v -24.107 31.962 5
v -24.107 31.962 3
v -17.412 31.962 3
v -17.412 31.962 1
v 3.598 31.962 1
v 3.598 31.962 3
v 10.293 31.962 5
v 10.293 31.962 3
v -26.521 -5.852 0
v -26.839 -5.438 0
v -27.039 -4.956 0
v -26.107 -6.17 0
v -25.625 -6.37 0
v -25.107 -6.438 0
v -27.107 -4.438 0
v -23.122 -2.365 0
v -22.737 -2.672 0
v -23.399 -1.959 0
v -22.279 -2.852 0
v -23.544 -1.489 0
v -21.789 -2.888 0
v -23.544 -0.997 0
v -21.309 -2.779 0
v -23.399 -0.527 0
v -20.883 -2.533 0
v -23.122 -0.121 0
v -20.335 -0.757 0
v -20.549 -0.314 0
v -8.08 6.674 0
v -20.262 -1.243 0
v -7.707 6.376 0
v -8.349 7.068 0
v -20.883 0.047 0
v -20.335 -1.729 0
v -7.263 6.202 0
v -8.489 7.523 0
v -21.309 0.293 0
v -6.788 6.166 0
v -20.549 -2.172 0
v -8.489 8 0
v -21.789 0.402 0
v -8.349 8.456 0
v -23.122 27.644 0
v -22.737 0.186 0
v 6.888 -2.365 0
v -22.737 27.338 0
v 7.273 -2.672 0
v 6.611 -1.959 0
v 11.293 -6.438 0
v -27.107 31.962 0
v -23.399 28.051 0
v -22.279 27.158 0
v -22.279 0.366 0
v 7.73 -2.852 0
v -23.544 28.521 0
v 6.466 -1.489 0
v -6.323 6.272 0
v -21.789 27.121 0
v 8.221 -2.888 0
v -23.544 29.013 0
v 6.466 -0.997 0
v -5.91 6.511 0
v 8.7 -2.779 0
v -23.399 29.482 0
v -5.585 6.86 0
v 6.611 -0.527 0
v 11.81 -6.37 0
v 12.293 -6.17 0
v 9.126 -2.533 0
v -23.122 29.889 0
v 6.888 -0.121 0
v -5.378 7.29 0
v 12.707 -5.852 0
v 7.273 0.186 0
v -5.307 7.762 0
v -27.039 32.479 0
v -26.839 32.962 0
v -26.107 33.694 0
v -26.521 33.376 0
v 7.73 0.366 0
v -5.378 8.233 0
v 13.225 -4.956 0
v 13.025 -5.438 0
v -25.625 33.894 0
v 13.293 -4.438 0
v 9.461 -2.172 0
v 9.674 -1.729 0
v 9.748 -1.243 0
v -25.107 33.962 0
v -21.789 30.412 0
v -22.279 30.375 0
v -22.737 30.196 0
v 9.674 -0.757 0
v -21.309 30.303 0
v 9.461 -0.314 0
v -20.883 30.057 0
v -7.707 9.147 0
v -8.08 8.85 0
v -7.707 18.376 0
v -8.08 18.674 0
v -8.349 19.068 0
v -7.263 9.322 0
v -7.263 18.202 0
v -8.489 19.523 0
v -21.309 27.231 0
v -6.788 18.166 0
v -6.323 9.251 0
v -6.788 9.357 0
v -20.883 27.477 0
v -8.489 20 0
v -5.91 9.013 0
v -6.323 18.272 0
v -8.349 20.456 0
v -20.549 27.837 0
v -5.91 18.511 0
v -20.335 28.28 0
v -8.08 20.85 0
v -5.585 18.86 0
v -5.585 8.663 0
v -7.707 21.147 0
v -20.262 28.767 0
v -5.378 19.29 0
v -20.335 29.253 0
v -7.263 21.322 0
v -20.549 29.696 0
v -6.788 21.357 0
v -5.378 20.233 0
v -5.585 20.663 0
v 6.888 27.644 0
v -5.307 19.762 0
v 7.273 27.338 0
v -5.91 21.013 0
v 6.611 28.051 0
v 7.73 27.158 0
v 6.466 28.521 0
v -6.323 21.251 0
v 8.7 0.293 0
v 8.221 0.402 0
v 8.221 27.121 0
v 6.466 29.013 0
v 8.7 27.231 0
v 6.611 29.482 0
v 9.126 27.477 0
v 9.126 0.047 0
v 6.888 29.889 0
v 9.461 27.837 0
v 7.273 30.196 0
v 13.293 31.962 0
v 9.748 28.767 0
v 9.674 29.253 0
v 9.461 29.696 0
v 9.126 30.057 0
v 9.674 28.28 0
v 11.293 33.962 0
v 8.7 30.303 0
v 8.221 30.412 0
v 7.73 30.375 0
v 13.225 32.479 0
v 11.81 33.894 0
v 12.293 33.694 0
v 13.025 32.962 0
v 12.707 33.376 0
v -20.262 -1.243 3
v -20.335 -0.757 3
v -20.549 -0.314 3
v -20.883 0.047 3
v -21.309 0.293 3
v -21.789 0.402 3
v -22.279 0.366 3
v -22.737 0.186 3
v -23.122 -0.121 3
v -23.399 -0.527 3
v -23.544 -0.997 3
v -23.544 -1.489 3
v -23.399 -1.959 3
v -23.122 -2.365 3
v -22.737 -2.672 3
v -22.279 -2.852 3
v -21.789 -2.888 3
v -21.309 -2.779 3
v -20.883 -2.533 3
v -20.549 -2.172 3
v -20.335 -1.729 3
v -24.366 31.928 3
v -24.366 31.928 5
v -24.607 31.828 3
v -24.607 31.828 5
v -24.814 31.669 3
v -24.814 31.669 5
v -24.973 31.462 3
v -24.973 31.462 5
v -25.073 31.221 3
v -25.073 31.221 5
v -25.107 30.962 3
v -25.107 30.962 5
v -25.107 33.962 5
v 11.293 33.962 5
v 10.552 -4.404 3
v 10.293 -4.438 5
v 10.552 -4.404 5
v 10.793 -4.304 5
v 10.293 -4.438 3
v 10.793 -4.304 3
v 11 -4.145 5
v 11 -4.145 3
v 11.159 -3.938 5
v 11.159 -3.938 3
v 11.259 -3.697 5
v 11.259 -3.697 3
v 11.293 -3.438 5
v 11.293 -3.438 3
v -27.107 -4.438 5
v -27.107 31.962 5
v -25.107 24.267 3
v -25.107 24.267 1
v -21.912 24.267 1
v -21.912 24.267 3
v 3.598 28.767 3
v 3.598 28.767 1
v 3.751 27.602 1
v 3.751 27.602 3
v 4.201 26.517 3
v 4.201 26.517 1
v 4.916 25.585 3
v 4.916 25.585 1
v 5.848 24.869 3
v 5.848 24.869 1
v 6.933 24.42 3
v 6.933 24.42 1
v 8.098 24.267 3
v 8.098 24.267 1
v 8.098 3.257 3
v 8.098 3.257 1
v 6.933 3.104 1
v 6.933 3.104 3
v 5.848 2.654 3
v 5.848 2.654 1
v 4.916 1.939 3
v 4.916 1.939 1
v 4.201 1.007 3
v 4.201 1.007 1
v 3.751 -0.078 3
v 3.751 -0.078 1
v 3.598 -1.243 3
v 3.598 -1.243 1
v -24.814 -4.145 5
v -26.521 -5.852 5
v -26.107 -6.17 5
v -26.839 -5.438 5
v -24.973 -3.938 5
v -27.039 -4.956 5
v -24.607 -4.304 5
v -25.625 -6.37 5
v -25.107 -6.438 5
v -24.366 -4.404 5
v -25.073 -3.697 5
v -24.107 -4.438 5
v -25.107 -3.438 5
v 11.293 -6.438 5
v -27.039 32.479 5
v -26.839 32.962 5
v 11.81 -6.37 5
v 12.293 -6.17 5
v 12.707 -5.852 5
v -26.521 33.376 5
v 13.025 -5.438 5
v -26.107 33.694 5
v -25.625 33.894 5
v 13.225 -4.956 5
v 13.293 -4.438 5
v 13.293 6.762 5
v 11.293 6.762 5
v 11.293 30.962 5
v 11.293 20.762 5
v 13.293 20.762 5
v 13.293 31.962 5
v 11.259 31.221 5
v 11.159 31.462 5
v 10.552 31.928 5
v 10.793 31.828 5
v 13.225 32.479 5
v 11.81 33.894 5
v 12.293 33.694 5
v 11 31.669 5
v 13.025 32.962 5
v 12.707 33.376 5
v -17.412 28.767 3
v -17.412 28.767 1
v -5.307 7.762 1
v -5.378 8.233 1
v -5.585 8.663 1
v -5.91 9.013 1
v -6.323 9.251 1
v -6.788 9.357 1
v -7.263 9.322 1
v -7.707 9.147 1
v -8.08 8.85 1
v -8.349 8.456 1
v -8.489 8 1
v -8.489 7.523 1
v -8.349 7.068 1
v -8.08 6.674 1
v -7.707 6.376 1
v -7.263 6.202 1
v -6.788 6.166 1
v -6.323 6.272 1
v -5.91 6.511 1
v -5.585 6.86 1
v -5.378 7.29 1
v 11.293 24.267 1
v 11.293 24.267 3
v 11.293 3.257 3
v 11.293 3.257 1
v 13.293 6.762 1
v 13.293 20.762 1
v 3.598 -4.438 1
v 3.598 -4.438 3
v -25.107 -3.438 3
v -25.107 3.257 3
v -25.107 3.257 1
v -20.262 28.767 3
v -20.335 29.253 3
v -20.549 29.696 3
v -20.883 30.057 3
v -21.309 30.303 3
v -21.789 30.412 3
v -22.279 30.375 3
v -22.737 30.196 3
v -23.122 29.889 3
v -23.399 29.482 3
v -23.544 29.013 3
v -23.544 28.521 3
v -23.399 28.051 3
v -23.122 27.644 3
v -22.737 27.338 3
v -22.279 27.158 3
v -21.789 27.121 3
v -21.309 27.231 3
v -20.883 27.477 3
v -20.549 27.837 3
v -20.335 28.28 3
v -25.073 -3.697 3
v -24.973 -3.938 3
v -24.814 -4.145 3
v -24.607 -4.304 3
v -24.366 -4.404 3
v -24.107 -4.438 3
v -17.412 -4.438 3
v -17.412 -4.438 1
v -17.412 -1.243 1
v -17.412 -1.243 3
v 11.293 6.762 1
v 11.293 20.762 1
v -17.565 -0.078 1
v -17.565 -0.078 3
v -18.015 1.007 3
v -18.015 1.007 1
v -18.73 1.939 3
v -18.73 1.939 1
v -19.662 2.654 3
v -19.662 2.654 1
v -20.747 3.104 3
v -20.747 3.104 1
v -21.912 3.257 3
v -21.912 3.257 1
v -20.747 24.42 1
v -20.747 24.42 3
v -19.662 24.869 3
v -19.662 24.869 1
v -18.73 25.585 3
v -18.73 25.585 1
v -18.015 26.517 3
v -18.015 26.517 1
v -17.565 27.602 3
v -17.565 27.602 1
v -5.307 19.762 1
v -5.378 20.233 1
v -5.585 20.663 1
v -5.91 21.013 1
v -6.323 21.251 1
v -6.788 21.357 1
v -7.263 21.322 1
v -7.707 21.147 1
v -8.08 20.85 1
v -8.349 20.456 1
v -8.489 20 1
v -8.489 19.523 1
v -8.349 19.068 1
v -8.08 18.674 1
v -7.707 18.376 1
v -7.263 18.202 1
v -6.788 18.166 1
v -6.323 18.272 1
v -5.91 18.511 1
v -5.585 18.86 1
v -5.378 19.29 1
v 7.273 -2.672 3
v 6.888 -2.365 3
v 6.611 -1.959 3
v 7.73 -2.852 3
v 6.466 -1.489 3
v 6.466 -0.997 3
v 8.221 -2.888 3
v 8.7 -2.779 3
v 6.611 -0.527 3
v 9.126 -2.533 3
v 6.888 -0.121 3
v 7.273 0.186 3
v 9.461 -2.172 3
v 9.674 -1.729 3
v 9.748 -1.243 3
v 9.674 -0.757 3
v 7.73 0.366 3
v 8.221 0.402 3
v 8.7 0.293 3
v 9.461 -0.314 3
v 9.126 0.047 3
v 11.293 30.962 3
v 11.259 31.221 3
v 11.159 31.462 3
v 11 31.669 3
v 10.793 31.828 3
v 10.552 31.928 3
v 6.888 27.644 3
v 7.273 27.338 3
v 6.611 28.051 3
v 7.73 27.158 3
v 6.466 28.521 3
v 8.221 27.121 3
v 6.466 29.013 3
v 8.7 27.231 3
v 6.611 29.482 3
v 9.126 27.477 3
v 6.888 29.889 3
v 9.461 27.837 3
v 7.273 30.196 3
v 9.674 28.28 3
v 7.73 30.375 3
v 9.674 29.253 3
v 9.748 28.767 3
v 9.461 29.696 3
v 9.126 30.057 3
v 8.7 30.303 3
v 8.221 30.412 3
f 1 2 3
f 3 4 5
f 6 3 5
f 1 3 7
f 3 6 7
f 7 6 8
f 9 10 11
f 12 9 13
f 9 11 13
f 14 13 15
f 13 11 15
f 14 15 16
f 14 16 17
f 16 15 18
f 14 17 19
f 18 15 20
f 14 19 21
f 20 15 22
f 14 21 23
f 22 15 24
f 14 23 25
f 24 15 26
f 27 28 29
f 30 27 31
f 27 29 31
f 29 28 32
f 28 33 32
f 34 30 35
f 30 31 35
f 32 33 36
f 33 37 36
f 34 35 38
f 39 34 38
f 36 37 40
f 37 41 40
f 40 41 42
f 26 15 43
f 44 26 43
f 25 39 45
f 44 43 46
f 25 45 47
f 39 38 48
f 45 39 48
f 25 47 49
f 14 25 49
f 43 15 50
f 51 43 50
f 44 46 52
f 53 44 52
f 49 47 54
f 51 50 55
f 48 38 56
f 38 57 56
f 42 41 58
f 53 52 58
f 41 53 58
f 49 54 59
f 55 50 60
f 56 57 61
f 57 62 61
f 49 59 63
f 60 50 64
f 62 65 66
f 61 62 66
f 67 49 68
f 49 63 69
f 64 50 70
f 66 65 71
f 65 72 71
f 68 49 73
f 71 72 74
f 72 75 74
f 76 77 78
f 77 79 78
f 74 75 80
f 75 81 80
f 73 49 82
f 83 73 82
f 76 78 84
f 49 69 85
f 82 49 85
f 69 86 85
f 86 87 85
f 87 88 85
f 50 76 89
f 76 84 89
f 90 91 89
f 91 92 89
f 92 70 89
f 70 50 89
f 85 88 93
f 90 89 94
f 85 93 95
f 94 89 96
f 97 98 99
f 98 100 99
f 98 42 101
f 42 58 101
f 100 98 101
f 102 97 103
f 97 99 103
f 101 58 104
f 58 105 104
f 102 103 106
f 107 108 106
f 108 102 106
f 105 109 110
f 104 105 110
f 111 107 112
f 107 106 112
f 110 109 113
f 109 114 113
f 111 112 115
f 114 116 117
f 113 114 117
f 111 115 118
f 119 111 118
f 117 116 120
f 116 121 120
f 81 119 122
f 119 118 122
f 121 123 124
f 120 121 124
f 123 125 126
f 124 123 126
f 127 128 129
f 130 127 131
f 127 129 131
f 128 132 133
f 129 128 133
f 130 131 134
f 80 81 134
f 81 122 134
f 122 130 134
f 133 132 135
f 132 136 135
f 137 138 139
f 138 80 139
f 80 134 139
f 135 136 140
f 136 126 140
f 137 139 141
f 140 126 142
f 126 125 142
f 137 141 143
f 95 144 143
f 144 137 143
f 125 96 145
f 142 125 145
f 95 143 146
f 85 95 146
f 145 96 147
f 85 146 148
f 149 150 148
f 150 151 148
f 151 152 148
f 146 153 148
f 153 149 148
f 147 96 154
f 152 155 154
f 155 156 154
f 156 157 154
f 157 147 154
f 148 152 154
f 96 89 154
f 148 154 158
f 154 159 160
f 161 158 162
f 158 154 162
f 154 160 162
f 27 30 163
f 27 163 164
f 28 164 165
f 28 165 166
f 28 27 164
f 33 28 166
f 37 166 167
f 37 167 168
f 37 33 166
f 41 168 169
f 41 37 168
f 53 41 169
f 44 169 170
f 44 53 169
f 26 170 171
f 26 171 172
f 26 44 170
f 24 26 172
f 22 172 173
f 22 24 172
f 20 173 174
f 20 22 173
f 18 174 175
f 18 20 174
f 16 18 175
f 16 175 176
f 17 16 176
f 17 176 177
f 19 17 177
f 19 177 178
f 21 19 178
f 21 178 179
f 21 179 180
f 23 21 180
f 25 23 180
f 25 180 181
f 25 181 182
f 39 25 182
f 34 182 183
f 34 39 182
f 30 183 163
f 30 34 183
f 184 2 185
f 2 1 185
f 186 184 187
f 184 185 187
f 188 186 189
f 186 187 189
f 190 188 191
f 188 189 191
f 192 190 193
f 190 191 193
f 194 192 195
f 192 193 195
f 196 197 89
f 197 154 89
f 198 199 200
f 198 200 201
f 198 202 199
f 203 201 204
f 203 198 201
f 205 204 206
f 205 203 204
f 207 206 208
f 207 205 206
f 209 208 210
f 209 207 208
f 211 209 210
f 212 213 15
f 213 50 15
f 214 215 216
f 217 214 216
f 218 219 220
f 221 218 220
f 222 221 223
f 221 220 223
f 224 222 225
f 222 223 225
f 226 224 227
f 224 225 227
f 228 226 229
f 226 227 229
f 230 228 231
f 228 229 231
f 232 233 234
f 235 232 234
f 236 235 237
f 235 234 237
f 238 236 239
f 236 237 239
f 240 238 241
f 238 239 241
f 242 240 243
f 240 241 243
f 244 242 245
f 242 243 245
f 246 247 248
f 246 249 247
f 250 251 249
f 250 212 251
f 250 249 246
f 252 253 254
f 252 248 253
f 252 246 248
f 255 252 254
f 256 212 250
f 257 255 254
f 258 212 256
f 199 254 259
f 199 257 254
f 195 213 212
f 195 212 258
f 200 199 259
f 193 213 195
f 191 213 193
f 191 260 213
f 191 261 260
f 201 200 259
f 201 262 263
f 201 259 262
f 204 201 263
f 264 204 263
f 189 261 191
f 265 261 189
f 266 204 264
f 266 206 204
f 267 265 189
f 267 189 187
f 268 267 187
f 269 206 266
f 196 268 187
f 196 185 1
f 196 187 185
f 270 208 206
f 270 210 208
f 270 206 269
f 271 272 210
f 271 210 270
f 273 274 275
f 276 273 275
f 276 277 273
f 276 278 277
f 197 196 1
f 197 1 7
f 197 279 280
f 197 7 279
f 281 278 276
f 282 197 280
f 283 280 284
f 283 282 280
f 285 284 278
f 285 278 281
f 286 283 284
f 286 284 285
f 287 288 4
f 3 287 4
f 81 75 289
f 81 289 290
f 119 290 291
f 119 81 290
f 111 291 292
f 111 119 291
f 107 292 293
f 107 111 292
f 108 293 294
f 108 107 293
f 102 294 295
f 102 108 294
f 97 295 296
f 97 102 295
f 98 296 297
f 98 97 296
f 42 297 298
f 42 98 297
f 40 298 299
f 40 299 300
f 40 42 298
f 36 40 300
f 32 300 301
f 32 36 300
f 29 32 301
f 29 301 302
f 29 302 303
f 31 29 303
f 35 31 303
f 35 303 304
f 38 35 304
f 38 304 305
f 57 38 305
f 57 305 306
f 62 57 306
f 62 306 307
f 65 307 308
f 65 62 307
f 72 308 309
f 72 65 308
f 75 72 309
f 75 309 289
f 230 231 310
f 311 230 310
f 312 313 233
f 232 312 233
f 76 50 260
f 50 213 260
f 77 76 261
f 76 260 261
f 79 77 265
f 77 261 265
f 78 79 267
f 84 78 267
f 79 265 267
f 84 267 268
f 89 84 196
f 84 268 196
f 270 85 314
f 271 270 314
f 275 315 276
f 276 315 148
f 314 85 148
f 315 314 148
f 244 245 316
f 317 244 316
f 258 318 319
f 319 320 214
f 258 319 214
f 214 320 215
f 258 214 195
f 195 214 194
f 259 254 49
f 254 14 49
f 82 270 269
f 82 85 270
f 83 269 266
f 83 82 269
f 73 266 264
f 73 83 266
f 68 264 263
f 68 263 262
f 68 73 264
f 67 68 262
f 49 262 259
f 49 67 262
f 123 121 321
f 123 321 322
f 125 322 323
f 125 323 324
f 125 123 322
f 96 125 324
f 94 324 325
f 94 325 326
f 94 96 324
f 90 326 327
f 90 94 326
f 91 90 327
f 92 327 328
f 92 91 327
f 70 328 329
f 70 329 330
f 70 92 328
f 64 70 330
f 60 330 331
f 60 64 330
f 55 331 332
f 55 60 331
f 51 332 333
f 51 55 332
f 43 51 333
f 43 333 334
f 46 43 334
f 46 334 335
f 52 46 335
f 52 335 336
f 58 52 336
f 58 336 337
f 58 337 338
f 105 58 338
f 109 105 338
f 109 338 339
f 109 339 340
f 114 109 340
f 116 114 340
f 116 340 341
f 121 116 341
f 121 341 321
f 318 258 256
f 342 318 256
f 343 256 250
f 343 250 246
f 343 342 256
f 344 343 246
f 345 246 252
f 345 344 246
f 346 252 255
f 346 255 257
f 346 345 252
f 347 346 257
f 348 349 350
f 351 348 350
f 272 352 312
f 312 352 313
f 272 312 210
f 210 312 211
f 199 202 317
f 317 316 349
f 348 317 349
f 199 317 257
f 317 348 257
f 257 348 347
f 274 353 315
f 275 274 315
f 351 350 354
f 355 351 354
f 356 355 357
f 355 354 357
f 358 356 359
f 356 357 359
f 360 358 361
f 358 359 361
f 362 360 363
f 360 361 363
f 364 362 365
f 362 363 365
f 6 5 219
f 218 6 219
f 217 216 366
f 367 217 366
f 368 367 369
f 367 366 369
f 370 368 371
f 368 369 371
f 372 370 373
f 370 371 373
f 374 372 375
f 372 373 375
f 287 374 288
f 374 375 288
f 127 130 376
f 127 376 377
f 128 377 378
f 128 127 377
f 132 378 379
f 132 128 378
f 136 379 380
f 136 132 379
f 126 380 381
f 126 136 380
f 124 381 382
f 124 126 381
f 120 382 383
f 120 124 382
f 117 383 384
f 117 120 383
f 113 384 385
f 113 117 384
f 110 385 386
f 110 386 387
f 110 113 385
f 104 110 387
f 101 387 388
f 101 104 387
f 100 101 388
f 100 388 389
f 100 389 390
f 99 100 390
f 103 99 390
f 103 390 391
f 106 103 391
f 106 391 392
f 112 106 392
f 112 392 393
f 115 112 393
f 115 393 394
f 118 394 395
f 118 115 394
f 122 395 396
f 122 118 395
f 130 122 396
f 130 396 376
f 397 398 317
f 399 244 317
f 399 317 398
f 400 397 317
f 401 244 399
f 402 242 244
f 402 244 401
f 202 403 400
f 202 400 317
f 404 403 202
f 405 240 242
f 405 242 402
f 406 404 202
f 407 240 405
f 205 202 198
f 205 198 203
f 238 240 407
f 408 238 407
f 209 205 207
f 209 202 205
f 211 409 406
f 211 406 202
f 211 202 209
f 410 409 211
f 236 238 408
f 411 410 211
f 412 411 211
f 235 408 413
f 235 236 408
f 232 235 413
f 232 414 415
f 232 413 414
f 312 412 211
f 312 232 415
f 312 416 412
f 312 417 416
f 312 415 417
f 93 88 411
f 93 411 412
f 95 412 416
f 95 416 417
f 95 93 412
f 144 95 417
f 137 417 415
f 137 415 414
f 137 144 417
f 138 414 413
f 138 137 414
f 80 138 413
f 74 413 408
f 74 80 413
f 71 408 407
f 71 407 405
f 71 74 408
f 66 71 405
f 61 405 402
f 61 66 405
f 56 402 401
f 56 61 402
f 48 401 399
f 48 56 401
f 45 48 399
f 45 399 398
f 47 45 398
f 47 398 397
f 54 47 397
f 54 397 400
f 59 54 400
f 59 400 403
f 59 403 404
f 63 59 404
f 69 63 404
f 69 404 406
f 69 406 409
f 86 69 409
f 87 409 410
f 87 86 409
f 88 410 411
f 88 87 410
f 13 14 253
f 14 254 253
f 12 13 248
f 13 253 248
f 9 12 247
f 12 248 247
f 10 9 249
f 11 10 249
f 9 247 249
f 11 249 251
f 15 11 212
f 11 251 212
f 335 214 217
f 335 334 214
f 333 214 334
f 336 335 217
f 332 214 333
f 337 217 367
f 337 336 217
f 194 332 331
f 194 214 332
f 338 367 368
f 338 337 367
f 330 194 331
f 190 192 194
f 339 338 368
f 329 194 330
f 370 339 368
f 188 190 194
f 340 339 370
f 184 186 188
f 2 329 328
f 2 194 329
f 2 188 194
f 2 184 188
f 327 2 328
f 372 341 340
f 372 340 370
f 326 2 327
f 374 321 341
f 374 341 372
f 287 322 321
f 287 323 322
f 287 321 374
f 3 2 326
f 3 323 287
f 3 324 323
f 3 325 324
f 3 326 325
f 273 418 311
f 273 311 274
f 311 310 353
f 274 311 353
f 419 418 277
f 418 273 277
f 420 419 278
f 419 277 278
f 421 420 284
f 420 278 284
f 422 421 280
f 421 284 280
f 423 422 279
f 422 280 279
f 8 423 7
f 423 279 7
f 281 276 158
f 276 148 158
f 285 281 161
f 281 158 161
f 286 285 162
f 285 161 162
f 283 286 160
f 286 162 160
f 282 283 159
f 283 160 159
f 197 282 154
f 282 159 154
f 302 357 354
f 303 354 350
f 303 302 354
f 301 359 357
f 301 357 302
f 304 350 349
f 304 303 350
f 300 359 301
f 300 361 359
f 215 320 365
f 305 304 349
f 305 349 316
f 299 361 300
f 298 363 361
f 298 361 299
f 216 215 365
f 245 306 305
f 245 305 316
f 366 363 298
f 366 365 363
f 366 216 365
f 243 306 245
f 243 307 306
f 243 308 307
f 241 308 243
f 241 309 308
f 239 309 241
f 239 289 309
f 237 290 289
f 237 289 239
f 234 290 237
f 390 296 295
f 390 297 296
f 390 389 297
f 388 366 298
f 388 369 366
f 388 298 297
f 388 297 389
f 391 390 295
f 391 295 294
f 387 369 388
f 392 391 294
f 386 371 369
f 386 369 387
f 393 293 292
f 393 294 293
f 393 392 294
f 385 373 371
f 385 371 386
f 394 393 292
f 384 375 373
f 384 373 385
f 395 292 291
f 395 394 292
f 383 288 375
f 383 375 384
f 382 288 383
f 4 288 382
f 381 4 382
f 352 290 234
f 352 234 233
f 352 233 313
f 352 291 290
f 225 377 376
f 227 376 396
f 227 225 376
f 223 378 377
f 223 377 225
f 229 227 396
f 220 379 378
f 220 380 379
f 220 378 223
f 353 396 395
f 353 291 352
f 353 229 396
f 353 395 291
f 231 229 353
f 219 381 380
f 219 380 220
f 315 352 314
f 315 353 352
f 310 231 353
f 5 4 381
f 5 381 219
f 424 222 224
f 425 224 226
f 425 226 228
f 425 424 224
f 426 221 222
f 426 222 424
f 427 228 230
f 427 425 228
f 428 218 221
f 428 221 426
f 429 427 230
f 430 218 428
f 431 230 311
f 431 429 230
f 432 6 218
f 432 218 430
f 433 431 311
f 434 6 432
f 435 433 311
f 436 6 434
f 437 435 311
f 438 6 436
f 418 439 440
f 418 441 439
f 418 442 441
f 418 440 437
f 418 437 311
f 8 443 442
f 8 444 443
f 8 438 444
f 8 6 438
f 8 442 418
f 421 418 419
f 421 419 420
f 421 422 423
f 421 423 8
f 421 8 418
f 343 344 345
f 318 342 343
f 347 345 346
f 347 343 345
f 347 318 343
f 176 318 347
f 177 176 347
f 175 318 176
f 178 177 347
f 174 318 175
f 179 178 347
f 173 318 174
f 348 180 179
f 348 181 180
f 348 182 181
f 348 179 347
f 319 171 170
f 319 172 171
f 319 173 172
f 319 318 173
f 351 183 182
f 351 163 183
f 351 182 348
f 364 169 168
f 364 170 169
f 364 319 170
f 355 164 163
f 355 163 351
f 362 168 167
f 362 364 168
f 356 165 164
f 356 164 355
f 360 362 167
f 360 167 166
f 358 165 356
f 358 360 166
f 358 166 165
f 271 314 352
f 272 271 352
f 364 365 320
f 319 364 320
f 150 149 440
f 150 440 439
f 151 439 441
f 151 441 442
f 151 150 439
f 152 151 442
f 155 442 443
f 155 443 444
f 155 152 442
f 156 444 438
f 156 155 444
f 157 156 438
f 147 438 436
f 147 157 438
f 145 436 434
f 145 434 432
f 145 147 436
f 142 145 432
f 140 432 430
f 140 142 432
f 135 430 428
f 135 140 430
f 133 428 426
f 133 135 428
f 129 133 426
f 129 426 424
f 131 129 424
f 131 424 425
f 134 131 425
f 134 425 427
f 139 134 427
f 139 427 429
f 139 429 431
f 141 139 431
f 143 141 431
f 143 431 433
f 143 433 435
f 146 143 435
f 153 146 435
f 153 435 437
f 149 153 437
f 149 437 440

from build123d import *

# Parameters (mm, degrees)
F0_R     = 1.6
F0_R_2   = 1.65
F0_W     = 2
F0_H     = 7
F1_DEPTH = 1
F2_DEPTH = 5
F3_DEPTH = 3
F4_R     = 2
F5_R     = 1


with BuildPart() as f1:
    # F0 (on Top) → F1 (new body)
    with BuildSketch(Plane.XY):
        with BuildLine():
            Line((-17.411994, -1.24302), (-17.411994, -4.438214))
            Line((-17.411994, -4.438214), (3.597618, -4.438214))
            Line((3.597618, -4.438214), (3.597618, -1.24302))
            ThreePointArc((3.597618, -1.24302), (4.915637, 1.93896), (8.097618, 3.25698))
            Line((8.097618, 3.25698), (11.292812, 3.25698))
            Line((11.292812, 3.25698), (11.292812, 6.761786))
            Line((11.292812, 6.761786), (11.292812, 13.761786))
            Line((11.292812, 13.761786), (11.292812, 20.761786))
            Line((11.292812, 20.761786), (11.292812, 24.266591))
            Line((11.292812, 24.266591), (8.097618, 24.266591))
            ThreePointArc((8.097618, 24.266591), (4.915637, 25.584611), (3.597618, 28.766591))
            Line((3.597618, 28.766591), (3.597618, 31.961786))
            Line((3.597618, 31.961786), (-17.411994, 31.961786))
            Line((-17.411994, 31.961786), (-17.411994, 28.766591))
            ThreePointArc((-17.411994, 28.766591), (-18.730013, 25.584611), (-21.911994, 24.266591))
            Line((-21.911994, 24.266591), (-25.107188, 24.266591))
            Line((-25.107188, 24.266591), (-25.107188, 3.25698))
            Line((-25.107188, 3.25698), (-21.911994, 3.25698))
            ThreePointArc((-21.911994, 3.25698), (-18.730013, 1.93896), (-17.411994, -1.24302))
        make_face()
        with Locations((-6.907188, 7.761786)):
            Circle(F0_R, mode=Mode.SUBTRACT)
        with Locations((-6.907188, 19.761786)):
            Circle(F0_R, mode=Mode.SUBTRACT)
        Polygon((-17.411994, -4.438214), (-25.107188, -4.438214), (-25.107188, 3.25698), (-25.107188, 24.266591), (-25.107188, 31.961786), (-17.411994, 31.961786), (3.597618, 31.961786), (11.292812, 31.961786), (11.292812, 24.266591), (11.292812, 20.761786), (13.292812, 20.761786), (13.292812, 33.961786), (-27.107188, 33.961786), (-27.107188, -6.438214), (13.292812, -6.438214), (13.292812, 6.761786), (11.292812, 6.761786), (11.292812, 3.25698), (11.292812, -4.438214), (3.597618, -4.438214), align=None)
        with BuildLine():
            Line((-25.107188, 31.961786), (-25.107188, 24.266591))
            Line((-25.107188, 24.266591), (-21.911994, 24.266591))
            ThreePointArc((-21.911994, 24.266591), (-18.730013, 25.584611), (-17.411994, 28.766591))
            Line((-17.411994, 28.766591), (-17.411994, 31.961786))
            Line((-17.411994, 31.961786), (-25.107188, 31.961786))
        make_face()
        with Locations((-21.911994, 28.766591)):
            Circle(F0_R_2, mode=Mode.SUBTRACT)
        with BuildLine():
            Line((11.292812, 31.961786), (3.597618, 31.961786))
            Line((3.597618, 31.961786), (3.597618, 28.766591))
            ThreePointArc((3.597618, 28.766591), (4.915637, 25.584611), (8.097618, 24.266591))
            Line((8.097618, 24.266591), (11.292812, 24.266591))
            Line((11.292812, 24.266591), (11.292812, 31.961786))
        make_face()
        with Locations((8.097618, 28.766591)):
            Circle(F0_R_2, mode=Mode.SUBTRACT)
        with Locations((12.292812, 17.261786)):
            Rectangle(F0_W, F0_H)
        with Locations((12.292812, 10.261786)):
            Rectangle(F0_W, F0_H)
    extrude(amount=F1_DEPTH)

    # F0 (on Top) → F2 (join)
    with BuildSketch(Plane.XY):
        Polygon((-17.411994, -4.438214), (-25.107188, -4.438214), (-25.107188, 3.25698), (-25.107188, 24.266591), (-25.107188, 31.961786), (-17.411994, 31.961786), (3.597618, 31.961786), (11.292812, 31.961786), (11.292812, 24.266591), (11.292812, 20.761786), (13.292812, 20.761786), (13.292812, 33.961786), (-27.107188, 33.961786), (-27.107188, -6.438214), (13.292812, -6.438214), (13.292812, 6.761786), (11.292812, 6.761786), (11.292812, 3.25698), (11.292812, -4.438214), (3.597618, -4.438214), align=None)
    extrude(amount=F2_DEPTH)

    # F0 (on Top) → F3 (join)
    with BuildSketch(Plane.XY):
        with BuildLine():
            Line((-25.107188, 31.961786), (-25.107188, 24.266591))
            Line((-25.107188, 24.266591), (-21.911994, 24.266591))
            ThreePointArc((-21.911994, 24.266591), (-18.730013, 25.584611), (-17.411994, 28.766591))
            Line((-17.411994, 28.766591), (-17.411994, 31.961786))
            Line((-17.411994, 31.961786), (-25.107188, 31.961786))
        make_face()
        with Locations((-21.911994, 28.766591)):
            Circle(F0_R_2, mode=Mode.SUBTRACT)
        with BuildLine():
            Line((-25.107188, 3.25698), (-25.107188, -4.438214))
            Line((-25.107188, -4.438214), (-17.411994, -4.438214))
            Line((-17.411994, -4.438214), (-17.411994, -1.24302))
            ThreePointArc((-17.411994, -1.24302), (-18.730013, 1.93896), (-21.911994, 3.25698))
            Line((-21.911994, 3.25698), (-25.107188, 3.25698))
        make_face()
        with Locations((-21.911994, -1.24302)):
            Circle(F0_R_2, mode=Mode.SUBTRACT)
        with BuildLine():
            Line((11.292812, 31.961786), (3.597618, 31.961786))
            Line((3.597618, 31.961786), (3.597618, 28.766591))
            ThreePointArc((3.597618, 28.766591), (4.915637, 25.584611), (8.097618, 24.266591))
            Line((8.097618, 24.266591), (11.292812, 24.266591))
            Line((11.292812, 24.266591), (11.292812, 31.961786))
        make_face()
        with Locations((8.097618, 28.766591)):
            Circle(F0_R_2, mode=Mode.SUBTRACT)
        with BuildLine():
            Line((3.597618, -1.24302), (3.597618, -4.438214))
            Line((3.597618, -4.438214), (11.292812, -4.438214))
            Line((11.292812, -4.438214), (11.292812, 3.25698))
            Line((11.292812, 3.25698), (8.097618, 3.25698))
            ThreePointArc((8.097618, 3.25698), (4.915637, 1.93896), (3.597618, -1.24302))
        make_face()
        with Locations((8.097618, -1.24302)):
            Circle(F0_R_2, mode=Mode.SUBTRACT)
    extrude(amount=F3_DEPTH)

    # F4
    f4_edges = [f1.edges().sort_by_distance(p)[0] for p in [
        (-27.107188, -6.438214, 2.5),
        (13.292812, -6.438214, 2.5),
        (13.292812, 33.961786, 2.5),
        (-27.107188, 33.961786, 2.5),
    ]]
    fillet(f4_edges, radius=F4_R)

    # F5
    f5_edges = [f1.edges().sort_by_distance(p)[0] for p in [
        (-25.107188, 31.961786, 4),
        (11.292812, 31.961786, 4),
        (11.292812, -4.438214, 4),
        (-25.107188, -4.438214, 4),
    ]]
    fillet(f5_edges, radius=F5_R)


solid = f1.part
